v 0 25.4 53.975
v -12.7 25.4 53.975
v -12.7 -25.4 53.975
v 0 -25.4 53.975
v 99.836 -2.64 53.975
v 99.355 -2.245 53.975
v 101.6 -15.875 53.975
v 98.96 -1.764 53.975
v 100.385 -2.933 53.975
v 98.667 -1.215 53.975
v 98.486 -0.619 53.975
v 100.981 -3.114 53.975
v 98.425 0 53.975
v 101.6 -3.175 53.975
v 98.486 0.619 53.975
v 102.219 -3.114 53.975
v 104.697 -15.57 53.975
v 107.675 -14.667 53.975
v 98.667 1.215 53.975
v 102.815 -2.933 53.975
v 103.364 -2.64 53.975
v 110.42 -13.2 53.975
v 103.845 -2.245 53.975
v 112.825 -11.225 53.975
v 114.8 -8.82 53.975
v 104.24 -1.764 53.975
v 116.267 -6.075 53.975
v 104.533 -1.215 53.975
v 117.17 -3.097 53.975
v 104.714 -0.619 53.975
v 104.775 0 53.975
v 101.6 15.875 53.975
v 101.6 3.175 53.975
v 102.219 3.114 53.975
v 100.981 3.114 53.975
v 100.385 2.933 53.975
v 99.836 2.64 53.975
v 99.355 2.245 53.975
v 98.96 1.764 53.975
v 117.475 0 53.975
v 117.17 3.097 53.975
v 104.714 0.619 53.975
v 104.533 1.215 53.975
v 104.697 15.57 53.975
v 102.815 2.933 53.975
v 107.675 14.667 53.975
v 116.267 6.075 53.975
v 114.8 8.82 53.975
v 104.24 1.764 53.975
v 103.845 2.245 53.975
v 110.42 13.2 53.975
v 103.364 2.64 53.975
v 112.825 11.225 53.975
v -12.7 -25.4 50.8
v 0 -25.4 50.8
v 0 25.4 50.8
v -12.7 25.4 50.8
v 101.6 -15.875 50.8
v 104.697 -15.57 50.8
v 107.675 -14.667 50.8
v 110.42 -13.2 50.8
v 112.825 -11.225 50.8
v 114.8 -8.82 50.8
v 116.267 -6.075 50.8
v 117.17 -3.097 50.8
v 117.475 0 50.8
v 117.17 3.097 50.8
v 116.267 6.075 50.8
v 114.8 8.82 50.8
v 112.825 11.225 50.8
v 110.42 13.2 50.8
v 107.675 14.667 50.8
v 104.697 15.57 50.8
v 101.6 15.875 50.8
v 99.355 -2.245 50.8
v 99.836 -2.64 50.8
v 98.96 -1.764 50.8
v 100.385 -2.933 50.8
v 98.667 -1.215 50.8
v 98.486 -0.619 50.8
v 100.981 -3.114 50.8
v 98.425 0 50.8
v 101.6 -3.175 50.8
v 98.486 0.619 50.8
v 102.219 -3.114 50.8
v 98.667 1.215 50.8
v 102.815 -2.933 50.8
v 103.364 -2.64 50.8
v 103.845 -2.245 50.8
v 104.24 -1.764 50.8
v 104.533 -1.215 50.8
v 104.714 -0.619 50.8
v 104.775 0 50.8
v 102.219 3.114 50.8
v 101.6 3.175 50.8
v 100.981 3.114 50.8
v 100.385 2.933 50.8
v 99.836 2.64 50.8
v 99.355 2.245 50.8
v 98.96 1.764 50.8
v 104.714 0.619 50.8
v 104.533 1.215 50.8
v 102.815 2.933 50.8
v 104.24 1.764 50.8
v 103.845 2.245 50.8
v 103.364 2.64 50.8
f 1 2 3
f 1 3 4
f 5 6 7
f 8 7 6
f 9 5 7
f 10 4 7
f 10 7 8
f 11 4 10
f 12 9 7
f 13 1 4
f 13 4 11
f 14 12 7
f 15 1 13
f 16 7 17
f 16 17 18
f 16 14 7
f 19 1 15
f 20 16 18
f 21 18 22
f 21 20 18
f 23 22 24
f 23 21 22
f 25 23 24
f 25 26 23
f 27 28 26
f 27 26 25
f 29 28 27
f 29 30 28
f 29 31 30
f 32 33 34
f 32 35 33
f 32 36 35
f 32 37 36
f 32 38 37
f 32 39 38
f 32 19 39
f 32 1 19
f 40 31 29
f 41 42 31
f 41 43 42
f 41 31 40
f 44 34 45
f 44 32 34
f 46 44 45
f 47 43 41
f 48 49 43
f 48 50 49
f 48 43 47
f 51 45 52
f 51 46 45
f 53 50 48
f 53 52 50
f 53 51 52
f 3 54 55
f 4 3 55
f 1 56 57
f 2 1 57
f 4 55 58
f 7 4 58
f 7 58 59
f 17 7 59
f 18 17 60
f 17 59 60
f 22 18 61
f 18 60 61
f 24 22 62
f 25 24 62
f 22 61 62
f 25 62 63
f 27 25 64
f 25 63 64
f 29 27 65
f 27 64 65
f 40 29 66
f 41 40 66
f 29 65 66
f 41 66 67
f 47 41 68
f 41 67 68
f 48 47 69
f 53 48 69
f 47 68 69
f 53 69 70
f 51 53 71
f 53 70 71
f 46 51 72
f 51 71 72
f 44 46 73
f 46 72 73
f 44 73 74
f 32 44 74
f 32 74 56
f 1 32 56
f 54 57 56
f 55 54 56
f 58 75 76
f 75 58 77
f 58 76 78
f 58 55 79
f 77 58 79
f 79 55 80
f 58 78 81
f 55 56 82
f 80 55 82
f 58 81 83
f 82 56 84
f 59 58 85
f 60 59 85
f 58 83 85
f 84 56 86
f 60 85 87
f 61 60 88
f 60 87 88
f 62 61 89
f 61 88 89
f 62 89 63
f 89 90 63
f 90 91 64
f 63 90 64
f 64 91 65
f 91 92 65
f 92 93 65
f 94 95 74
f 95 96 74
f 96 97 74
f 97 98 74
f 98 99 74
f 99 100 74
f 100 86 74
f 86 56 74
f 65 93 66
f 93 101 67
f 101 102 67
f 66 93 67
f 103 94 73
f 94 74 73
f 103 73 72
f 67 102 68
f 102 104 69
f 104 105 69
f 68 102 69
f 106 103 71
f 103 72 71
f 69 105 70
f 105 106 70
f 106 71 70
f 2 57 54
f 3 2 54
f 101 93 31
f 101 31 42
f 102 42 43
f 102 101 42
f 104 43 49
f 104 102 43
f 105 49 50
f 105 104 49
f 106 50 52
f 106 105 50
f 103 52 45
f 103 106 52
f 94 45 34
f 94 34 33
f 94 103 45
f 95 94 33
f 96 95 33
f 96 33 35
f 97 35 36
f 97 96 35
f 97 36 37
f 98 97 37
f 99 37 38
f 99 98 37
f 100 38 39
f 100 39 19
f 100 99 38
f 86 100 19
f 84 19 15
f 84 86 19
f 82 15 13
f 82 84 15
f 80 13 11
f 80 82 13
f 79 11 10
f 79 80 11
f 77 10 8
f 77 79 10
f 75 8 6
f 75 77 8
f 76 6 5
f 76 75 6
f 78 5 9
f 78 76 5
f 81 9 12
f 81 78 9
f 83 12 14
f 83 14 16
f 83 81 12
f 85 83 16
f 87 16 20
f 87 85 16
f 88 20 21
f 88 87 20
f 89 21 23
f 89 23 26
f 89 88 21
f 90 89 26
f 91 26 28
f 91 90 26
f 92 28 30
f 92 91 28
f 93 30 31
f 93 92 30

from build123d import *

# Parameters (mm, degrees)
SKETCH1_R           = 3.175
BOSS_EXTRUDE1_DEPTH = 3.175


with BuildPart() as part:
    # Sketch1 → Boss-Extrude1 (new body)
    with BuildSketch(Plane.XY.offset(50.8)):
        with BuildLine():
            Line((101.6, 15.875), (0, 25.4))
            Line((0, 25.4), (-12.7, 25.4))
            Line((-12.7, 25.4), (-12.7, -25.4))
            Line((-12.7, -25.4), (0, -25.4))
            Line((0, -25.4), (101.6, -15.875))
            ThreePointArc((101.6, -15.875), (117.475, 0), (101.6, 15.875))
        make_face()
        with Locations((101.6, 0)):
            Circle(SKETCH1_R, mode=Mode.SUBTRACT)
    extrude(amount=BOSS_EXTRUDE1_DEPTH)


solid = part.part
